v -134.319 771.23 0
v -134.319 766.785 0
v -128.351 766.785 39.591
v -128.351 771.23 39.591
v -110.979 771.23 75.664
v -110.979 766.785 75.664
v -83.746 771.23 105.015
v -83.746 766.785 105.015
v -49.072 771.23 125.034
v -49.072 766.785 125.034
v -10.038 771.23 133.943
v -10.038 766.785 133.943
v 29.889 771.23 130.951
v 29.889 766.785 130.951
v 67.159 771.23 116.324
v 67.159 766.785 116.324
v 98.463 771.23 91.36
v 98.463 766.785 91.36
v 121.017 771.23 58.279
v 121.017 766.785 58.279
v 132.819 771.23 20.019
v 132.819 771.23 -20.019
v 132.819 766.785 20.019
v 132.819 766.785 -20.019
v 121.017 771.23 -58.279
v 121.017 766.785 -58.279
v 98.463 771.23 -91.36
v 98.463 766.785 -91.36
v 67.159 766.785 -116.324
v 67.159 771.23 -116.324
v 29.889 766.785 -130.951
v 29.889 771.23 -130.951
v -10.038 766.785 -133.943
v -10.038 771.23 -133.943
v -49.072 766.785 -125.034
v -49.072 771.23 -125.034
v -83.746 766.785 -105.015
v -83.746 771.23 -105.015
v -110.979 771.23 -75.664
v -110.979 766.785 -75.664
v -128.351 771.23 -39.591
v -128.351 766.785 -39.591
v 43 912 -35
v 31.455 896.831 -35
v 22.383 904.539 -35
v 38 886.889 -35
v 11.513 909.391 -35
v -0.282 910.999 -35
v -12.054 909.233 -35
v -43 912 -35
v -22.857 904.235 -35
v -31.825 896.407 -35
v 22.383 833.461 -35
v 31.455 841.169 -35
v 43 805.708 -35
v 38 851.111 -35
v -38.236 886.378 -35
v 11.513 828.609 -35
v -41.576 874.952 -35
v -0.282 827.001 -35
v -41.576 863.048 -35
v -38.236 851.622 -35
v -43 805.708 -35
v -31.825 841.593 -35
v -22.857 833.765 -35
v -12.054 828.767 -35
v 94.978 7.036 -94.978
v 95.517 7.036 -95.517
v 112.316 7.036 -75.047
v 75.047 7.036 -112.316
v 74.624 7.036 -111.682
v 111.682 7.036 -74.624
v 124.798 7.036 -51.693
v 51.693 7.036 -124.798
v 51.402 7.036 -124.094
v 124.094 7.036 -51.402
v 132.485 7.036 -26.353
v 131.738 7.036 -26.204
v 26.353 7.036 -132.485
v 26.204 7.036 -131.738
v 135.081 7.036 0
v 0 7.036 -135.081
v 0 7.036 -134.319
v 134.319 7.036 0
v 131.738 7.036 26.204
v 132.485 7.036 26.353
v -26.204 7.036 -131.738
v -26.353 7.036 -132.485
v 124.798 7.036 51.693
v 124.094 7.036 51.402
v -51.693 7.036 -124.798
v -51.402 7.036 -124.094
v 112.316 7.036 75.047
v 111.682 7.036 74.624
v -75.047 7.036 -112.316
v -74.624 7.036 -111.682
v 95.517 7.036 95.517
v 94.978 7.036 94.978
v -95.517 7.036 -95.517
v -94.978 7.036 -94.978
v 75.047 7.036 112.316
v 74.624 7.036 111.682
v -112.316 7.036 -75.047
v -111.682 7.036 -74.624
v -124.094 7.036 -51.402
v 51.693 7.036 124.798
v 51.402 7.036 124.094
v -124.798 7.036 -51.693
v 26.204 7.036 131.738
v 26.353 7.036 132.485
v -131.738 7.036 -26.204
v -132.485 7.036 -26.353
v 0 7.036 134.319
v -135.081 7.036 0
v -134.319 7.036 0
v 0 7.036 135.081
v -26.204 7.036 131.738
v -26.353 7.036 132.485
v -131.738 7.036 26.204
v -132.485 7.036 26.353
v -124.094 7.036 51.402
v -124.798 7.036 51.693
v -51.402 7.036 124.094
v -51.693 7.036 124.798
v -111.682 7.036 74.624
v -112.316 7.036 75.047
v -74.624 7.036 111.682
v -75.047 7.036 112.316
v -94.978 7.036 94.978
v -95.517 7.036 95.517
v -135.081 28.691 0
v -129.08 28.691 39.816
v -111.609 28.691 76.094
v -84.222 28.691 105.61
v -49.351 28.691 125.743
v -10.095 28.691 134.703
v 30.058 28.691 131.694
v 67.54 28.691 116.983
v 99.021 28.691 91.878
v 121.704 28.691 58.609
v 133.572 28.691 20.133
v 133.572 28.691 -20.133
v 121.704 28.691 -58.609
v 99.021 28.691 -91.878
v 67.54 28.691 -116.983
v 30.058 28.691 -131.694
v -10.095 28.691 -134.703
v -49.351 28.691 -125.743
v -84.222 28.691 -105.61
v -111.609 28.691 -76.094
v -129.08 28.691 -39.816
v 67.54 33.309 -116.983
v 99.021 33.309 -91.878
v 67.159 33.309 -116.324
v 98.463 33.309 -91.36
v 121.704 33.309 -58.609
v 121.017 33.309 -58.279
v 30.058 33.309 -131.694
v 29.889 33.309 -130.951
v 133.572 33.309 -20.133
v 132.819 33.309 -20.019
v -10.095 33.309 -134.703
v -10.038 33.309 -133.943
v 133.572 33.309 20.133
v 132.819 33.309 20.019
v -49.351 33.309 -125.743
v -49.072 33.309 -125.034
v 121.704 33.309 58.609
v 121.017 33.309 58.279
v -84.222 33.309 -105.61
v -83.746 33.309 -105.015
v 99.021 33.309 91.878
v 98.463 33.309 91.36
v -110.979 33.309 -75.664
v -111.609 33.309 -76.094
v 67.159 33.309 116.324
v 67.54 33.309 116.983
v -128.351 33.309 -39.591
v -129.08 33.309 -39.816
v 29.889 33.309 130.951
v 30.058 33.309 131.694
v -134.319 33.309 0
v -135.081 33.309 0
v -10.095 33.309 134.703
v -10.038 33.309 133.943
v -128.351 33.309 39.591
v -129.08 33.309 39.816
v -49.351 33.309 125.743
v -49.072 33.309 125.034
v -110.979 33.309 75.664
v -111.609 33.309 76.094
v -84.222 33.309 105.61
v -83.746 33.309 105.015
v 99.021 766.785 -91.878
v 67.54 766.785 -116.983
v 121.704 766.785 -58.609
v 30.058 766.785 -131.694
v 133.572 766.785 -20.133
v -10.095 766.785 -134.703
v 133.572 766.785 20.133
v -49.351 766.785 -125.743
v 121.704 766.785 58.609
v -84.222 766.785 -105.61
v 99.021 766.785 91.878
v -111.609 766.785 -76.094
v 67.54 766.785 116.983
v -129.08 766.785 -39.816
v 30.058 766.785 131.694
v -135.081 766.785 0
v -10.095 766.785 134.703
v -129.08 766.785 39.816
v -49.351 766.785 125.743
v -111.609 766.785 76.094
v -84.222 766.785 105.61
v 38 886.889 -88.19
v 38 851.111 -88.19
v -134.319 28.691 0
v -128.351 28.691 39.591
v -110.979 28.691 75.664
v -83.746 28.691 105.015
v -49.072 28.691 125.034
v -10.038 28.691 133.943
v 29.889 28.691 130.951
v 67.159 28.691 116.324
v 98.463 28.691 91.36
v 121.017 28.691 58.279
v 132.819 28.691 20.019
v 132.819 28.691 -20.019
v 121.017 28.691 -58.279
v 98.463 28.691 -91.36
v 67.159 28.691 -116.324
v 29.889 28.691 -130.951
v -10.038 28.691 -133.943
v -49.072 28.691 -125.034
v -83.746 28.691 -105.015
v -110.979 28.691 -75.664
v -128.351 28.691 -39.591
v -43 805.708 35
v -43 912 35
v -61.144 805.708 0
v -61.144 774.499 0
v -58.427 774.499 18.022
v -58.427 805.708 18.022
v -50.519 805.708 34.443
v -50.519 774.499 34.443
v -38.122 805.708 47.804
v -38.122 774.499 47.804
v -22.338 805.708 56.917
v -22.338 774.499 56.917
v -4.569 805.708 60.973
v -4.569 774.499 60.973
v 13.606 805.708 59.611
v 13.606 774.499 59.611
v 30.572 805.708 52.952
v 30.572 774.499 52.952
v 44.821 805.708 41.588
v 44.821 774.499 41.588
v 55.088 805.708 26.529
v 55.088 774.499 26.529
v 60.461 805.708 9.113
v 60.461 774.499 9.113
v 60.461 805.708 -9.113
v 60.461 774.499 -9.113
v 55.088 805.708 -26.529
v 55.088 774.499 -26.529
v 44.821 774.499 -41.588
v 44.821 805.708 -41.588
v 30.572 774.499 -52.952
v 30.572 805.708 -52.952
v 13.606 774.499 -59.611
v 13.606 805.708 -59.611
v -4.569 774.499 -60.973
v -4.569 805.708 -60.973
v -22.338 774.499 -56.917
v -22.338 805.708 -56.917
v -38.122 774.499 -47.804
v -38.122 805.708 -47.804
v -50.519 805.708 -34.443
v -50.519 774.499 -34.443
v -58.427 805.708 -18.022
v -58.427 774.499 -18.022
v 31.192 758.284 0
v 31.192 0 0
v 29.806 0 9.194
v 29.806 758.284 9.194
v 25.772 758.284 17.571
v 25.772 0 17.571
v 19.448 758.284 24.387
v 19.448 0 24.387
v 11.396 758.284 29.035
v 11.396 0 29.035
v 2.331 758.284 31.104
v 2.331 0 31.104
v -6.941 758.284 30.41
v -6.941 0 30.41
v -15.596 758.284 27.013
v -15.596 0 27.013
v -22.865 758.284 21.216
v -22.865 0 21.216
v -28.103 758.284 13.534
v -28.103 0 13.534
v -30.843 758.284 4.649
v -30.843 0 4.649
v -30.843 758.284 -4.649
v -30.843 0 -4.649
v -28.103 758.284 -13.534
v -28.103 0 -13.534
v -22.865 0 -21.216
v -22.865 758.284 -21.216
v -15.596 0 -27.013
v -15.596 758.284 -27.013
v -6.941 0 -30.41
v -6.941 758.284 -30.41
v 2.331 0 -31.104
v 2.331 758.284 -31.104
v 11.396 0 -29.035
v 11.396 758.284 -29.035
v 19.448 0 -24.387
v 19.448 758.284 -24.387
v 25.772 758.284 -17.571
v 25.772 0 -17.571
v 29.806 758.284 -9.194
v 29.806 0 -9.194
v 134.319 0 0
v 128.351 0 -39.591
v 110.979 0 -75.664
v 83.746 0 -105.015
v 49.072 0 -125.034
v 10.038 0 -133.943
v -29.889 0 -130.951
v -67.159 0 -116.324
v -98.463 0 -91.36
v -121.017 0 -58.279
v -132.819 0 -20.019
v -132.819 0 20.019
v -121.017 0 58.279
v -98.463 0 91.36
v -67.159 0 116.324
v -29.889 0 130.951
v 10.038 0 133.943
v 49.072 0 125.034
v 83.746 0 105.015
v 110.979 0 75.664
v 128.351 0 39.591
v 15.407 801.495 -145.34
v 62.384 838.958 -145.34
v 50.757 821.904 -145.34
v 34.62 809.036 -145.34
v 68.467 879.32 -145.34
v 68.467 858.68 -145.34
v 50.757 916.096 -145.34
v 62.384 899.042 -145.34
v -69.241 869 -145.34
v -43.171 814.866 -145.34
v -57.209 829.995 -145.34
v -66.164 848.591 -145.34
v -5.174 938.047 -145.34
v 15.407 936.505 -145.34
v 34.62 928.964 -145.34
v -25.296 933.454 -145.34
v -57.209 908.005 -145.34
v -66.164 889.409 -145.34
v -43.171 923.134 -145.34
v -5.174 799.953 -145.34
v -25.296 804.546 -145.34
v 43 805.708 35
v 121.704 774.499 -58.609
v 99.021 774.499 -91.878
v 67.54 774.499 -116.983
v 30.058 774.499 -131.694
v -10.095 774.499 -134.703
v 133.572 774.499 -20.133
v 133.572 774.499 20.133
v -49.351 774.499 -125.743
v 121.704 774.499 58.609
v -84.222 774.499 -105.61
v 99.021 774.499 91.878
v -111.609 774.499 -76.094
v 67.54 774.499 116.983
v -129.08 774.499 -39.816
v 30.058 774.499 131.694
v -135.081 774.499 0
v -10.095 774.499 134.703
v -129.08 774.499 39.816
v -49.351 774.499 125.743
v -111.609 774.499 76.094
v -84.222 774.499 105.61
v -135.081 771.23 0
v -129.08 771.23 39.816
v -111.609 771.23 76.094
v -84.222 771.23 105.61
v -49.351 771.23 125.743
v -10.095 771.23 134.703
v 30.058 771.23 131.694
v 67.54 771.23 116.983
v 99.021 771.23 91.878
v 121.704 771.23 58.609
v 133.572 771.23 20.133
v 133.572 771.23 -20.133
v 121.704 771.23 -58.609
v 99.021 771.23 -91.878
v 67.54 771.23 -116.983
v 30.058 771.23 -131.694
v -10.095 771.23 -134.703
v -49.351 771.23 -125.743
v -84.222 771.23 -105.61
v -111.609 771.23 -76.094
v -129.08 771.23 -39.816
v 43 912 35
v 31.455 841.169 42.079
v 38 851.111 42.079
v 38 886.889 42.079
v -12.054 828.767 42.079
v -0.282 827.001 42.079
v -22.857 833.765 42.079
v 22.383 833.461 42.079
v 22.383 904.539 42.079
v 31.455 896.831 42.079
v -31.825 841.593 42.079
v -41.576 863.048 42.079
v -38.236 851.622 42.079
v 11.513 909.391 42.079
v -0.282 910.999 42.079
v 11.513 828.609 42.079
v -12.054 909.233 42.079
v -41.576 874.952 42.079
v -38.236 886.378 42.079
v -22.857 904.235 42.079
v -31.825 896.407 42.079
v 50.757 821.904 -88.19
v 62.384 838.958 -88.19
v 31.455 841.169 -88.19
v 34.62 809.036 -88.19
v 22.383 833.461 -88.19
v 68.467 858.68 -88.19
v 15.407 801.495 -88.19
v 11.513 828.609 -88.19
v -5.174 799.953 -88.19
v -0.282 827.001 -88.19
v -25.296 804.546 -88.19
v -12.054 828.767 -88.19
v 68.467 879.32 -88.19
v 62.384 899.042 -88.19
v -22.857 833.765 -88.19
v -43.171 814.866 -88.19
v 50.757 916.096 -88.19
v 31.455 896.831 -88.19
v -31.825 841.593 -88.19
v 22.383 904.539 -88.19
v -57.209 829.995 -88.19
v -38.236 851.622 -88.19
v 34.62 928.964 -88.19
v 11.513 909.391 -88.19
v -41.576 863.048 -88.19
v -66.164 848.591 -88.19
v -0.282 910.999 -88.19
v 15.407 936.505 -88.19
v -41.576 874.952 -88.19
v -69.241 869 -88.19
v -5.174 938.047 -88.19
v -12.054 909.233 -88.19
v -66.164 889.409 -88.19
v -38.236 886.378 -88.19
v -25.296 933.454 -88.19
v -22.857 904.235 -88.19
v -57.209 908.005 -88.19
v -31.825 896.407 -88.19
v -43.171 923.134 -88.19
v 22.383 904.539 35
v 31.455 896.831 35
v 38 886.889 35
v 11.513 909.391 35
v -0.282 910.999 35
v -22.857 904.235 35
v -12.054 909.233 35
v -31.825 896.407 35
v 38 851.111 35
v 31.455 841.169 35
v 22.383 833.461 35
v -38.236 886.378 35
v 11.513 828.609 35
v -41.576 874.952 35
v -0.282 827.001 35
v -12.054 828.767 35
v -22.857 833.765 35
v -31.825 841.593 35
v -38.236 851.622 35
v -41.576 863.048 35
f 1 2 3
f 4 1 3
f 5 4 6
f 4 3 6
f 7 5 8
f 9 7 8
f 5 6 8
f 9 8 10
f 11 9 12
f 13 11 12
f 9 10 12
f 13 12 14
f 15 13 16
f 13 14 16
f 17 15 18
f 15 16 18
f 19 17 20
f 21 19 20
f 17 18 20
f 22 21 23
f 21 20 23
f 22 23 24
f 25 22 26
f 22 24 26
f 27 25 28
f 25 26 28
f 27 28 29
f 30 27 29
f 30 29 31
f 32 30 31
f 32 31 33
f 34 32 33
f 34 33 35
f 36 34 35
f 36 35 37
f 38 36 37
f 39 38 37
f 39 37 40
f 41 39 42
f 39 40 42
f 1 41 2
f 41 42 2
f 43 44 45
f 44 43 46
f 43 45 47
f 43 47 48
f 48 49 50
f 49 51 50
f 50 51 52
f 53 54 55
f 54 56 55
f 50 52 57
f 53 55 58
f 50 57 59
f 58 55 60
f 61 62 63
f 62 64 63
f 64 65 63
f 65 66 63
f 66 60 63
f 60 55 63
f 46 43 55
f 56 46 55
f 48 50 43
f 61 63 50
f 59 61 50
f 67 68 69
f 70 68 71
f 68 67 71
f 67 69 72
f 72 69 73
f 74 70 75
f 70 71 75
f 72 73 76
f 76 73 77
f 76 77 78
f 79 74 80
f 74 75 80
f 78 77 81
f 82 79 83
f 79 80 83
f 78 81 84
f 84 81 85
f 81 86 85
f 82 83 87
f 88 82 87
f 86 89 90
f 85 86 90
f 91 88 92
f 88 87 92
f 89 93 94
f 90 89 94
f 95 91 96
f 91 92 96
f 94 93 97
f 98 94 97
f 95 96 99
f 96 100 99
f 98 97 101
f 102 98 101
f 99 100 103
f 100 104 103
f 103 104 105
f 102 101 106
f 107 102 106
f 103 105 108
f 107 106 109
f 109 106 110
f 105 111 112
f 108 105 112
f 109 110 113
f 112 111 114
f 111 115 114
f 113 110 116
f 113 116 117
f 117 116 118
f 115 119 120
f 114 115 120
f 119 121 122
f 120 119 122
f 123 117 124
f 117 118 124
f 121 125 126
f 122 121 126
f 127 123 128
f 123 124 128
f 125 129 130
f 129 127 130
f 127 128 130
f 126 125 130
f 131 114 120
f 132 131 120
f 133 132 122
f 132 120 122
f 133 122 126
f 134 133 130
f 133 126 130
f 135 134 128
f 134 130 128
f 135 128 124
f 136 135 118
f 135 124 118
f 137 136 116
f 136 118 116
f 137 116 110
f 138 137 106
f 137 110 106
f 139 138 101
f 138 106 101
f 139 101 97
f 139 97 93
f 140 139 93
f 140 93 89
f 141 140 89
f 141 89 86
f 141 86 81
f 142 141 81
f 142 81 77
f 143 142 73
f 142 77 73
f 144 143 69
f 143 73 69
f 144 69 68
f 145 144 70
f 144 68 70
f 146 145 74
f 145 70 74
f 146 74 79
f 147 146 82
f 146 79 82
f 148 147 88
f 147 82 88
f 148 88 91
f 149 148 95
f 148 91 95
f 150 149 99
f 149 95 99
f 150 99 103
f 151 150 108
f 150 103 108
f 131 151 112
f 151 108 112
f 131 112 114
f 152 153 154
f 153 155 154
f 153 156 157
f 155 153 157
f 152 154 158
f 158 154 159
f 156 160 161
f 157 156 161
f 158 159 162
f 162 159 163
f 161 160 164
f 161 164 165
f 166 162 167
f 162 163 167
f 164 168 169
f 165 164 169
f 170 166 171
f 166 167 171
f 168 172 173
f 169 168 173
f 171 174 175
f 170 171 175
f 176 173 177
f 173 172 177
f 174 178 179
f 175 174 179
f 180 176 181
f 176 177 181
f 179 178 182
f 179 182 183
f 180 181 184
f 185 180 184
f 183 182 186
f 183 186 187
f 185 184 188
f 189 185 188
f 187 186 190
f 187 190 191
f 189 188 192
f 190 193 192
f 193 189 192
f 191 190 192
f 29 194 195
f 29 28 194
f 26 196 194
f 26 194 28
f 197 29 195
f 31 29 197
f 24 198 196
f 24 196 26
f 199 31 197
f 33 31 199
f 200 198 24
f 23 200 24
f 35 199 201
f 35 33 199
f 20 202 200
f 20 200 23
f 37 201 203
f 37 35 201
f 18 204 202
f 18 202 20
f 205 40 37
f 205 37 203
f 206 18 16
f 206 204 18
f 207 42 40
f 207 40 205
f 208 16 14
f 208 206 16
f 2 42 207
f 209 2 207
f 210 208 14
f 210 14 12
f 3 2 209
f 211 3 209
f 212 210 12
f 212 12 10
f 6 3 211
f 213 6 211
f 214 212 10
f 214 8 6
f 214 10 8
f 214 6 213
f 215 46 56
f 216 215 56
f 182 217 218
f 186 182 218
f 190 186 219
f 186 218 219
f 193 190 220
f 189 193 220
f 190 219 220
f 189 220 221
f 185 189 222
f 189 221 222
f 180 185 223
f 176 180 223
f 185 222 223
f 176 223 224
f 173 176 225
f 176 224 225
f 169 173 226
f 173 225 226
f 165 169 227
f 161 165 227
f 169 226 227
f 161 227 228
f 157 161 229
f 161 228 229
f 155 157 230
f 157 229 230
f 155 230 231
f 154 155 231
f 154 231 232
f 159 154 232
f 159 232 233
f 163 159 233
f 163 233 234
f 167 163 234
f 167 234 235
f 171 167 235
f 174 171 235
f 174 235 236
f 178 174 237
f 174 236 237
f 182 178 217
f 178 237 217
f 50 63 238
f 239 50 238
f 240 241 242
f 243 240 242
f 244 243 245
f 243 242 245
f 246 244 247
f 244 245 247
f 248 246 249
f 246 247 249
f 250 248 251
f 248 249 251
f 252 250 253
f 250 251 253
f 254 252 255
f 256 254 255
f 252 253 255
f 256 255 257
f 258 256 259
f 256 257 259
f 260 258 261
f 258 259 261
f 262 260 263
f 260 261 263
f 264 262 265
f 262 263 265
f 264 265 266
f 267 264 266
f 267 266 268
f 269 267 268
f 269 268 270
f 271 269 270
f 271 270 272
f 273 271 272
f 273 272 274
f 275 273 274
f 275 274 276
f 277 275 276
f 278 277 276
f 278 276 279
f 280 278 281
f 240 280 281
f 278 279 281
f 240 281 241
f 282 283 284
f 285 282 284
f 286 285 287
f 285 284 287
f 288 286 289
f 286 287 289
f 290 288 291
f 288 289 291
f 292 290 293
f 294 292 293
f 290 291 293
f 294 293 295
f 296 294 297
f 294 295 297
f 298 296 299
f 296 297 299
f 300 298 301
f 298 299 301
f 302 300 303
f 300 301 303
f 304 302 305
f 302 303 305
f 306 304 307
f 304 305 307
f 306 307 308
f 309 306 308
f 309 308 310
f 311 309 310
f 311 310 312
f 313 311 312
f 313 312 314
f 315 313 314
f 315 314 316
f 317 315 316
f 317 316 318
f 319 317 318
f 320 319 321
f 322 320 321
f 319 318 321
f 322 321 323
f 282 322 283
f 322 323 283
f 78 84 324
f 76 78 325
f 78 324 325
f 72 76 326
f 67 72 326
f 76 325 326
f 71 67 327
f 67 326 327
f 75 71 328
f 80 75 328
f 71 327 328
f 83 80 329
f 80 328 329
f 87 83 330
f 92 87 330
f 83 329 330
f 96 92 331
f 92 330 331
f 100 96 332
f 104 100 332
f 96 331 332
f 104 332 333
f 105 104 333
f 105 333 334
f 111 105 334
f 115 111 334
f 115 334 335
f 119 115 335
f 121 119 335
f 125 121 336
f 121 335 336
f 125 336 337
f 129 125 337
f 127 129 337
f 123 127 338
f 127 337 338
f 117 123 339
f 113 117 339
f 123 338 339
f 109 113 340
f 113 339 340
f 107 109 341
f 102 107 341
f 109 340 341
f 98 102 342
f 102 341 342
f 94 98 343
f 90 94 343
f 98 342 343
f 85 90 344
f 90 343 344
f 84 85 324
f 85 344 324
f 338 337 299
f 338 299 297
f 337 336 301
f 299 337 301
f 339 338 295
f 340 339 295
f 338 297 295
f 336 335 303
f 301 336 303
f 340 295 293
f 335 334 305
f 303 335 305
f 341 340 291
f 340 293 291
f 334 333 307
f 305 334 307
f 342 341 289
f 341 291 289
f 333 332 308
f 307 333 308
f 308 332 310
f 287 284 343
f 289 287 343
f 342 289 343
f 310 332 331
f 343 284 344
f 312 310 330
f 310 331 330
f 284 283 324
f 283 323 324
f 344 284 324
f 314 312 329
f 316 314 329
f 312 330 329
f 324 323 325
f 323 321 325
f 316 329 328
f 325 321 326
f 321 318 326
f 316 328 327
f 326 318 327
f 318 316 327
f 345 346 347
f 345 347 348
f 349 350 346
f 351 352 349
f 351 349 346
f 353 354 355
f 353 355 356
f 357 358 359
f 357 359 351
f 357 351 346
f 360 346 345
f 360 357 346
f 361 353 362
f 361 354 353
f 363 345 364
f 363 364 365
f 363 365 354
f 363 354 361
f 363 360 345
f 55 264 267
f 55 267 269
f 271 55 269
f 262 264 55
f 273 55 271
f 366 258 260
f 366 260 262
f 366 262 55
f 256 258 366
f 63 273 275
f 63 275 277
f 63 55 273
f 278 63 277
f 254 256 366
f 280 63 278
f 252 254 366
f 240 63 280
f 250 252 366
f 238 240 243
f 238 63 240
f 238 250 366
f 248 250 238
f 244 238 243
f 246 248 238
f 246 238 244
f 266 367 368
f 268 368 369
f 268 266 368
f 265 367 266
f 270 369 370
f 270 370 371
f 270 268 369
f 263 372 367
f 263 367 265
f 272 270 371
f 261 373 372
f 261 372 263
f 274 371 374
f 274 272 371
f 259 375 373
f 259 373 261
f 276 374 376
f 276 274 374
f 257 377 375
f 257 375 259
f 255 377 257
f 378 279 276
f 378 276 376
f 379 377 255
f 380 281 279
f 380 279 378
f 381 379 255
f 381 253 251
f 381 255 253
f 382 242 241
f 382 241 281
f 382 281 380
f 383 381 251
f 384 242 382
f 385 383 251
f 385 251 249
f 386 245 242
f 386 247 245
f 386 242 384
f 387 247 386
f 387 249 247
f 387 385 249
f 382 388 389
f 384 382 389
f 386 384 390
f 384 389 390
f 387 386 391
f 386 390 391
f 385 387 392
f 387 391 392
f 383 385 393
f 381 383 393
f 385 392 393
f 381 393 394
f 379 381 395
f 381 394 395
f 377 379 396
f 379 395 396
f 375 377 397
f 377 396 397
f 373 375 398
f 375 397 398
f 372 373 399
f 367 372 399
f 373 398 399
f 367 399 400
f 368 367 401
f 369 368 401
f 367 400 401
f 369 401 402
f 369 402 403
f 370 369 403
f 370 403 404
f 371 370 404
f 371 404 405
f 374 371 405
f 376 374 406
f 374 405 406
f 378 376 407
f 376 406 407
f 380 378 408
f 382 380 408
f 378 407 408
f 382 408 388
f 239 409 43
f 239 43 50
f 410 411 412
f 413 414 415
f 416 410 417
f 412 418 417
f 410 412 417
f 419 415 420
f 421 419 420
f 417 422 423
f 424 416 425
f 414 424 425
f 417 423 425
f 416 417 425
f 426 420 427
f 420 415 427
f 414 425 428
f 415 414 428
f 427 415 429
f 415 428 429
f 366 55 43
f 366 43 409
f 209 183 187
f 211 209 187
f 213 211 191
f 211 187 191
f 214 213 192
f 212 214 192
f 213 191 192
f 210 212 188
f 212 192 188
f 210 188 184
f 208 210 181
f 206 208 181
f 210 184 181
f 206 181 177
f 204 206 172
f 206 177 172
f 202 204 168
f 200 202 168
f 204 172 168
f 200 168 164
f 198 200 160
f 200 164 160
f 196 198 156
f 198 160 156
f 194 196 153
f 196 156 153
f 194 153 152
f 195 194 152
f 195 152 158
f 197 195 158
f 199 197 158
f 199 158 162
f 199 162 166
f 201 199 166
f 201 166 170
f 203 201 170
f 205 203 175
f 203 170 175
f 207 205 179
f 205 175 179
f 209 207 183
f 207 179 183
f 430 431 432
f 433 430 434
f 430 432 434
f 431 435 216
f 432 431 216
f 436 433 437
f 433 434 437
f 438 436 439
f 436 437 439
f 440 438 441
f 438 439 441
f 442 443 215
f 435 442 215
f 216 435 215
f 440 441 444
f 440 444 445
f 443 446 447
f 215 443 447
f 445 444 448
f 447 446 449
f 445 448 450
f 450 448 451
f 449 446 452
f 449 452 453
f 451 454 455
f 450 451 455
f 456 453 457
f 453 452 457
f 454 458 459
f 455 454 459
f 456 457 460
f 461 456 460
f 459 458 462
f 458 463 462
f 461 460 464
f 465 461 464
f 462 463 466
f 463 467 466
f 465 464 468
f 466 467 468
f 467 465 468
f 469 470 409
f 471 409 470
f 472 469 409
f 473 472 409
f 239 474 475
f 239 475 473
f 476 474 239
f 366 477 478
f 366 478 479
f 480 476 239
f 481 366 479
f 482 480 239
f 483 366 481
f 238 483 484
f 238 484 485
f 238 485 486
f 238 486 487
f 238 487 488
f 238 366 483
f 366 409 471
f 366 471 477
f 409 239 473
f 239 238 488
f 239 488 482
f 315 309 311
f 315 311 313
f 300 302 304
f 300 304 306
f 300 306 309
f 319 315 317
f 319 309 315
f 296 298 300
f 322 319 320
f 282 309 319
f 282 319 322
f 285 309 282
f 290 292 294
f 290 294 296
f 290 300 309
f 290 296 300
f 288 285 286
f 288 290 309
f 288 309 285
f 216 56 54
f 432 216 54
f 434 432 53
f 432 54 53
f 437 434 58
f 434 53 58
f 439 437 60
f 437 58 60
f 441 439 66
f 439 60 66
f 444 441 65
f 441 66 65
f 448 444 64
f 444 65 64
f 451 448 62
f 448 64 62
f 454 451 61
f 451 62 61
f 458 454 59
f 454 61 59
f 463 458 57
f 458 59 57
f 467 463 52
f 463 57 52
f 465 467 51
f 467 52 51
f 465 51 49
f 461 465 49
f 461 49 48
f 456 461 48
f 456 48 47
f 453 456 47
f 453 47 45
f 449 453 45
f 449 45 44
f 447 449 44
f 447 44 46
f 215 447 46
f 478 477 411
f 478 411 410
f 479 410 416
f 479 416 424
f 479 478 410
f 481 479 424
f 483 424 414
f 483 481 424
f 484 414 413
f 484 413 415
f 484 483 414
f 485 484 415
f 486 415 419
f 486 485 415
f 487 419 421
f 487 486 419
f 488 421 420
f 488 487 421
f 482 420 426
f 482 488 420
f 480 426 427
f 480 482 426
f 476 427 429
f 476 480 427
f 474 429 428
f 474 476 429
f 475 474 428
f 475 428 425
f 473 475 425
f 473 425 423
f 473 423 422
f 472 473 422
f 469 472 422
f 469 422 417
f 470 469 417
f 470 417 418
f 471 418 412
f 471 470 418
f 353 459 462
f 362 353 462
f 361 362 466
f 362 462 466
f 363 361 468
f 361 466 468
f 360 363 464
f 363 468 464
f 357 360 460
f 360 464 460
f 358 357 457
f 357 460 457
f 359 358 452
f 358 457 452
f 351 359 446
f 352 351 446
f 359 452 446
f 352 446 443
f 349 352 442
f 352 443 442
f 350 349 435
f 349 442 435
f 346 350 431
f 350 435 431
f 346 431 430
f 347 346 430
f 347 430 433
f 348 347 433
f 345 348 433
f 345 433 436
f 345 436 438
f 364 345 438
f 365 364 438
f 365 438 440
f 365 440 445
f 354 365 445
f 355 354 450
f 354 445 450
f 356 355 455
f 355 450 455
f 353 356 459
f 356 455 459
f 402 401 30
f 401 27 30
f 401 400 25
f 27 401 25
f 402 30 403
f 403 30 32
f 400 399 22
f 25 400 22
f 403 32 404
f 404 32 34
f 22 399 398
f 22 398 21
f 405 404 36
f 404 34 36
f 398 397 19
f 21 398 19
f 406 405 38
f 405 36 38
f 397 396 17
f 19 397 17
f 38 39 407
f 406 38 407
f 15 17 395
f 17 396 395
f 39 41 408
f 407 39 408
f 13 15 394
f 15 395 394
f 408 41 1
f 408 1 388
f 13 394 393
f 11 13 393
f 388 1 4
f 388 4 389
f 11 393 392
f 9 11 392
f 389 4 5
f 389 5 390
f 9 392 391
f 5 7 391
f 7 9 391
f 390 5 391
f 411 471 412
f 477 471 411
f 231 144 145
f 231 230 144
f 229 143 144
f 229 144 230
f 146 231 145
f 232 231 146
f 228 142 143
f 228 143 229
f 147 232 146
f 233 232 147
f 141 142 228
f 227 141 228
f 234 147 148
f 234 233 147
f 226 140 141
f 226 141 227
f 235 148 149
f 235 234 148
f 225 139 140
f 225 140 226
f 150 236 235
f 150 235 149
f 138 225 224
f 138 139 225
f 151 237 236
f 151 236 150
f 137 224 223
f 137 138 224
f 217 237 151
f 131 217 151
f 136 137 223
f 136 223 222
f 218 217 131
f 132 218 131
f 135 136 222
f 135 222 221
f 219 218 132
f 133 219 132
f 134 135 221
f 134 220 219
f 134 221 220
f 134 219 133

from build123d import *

# Parameters (mm, degrees)
SKETCH6_R           = 134.318809958
EXTRUDE1_DEPTH      = 7.0358
SKETCH7_R           = 135.080809958
EXTRUDE2_DEPTH      = 21.6548
SKETCH8_R           = 134.318809958
EXTRUDE3_DEPTH      = 4.6188
SKETCH9_R           = 135.080809958
EXTRUDE4_DEPTH      = 733.4758
SKETCH10_R          = 134.318809958
EXTRUDE5_DEPTH      = 4.445
SKETCH11_R          = 135.080809958
EXTRUDE6_DEPTH      = 3.26898
SKETCH12_R          = 61.143546623
EXTRUDE7_DEPTH      = 31.20898
SKETCH13_W          = 86
SKETCH13_H          = 70
EXTRUDE8_DEPTH      = 106.29184
EXTRUDE9_DEPTH      = 7.07898
EXTRUDE9_DEPTH_BACK = 123.19
SKETCH15_R          = 69.240552209
EXTRUDE10_DEPTH     = 57.15
SKETCH16_R          = 31.191641703
CUT_EXTRUDE1_DEPTH  = 758.28398


with BuildPart() as part:
    # Sketch6 → Extrude1 (new body)
    with BuildSketch(Plane(origin=(0, 0, 0), x_dir=(1, 0, 0), z_dir=(0, 1, 0))):
        Circle(SKETCH6_R)
    extrude(amount=EXTRUDE1_DEPTH)

    # Sketch7 → Extrude2 (add)
    with BuildSketch(Plane(origin=(0, 7.0358, 0), x_dir=(-1, 0, 0), z_dir=(0, 1, 0))):
        Circle(SKETCH7_R)
    extrude(amount=EXTRUDE2_DEPTH)

    # Sketch8 → Extrude3 (add)
    with BuildSketch(Plane(origin=(0, 28.6906, 0), x_dir=(-1, 0, 0), z_dir=(0, 1, 0))):
        Circle(SKETCH8_R)
    extrude(amount=EXTRUDE3_DEPTH)

    # Sketch9 → Extrude4 (add)
    with BuildSketch(Plane(origin=(0, 33.3094, 0), x_dir=(-1, 0, 0), z_dir=(0, 1, 0))):
        Circle(SKETCH9_R)
    extrude(amount=EXTRUDE4_DEPTH)

    # Sketch10 → Extrude5 (add)
    with BuildSketch(Plane(origin=(0, 766.7852, 0), x_dir=(-1, 0, 0), z_dir=(0, 1, 0))):
        Circle(SKETCH10_R)
    extrude(amount=EXTRUDE5_DEPTH)

    # Sketch11 → Extrude6 (add)
    with BuildSketch(Plane(origin=(0, 771.2302, 0), x_dir=(-1, 0, 0), z_dir=(0, 1, 0))):
        Circle(SKETCH11_R)
    extrude(amount=EXTRUDE6_DEPTH)

    # Sketch12 → Extrude7 (add)
    with BuildSketch(Plane(origin=(0, 774.49918, 0), x_dir=(-1, 0, 0), z_dir=(0, 1, 0))):
        Circle(SKETCH12_R)
    extrude(amount=EXTRUDE7_DEPTH)

    # Sketch13 → Extrude8 (add)
    with BuildSketch(Plane(origin=(0, 805.70816, 0), x_dir=(-1, 0, 0), z_dir=(0, 1, 0))):
        with Locations((0, 4.8e-08)):
            Rectangle(SKETCH13_W, SKETCH13_H)
    extrude(amount=EXTRUDE8_DEPTH)

    # Sketch14 → Extrude9 (add, two sides)
    with BuildSketch(Plane.XY.offset(35.000000048)) as extrude9_sk:
        with BuildLine():
            Line((37.999996487, 886.888547526), (37.999996487, 851.111452474))
            ThreePointArc((37.999996487, 851.111452474), (-41.9999984, 869), (37.999996487, 886.888547526))
        make_face()
    extrude(amount=EXTRUDE9_DEPTH)
    extrude(extrude9_sk.sketch, amount=-EXTRUDE9_DEPTH_BACK)

    # Sketch15 → Extrude10 (add)
    with BuildSketch(Plane(origin=(0, 0, -88.189999952), x_dir=(-1, 0, 0), z_dir=(0, 0, -1))):
        with Locations((0, 869)):
            Circle(SKETCH15_R)
    extrude(amount=EXTRUDE10_DEPTH)

    # Sketch16 → Cut-Extrude1 (cut)
    with BuildSketch(Plane.XZ):
        Circle(SKETCH16_R)
    extrude(amount=-CUT_EXTRUDE1_DEPTH, mode=Mode.SUBTRACT)


solid = part.part
